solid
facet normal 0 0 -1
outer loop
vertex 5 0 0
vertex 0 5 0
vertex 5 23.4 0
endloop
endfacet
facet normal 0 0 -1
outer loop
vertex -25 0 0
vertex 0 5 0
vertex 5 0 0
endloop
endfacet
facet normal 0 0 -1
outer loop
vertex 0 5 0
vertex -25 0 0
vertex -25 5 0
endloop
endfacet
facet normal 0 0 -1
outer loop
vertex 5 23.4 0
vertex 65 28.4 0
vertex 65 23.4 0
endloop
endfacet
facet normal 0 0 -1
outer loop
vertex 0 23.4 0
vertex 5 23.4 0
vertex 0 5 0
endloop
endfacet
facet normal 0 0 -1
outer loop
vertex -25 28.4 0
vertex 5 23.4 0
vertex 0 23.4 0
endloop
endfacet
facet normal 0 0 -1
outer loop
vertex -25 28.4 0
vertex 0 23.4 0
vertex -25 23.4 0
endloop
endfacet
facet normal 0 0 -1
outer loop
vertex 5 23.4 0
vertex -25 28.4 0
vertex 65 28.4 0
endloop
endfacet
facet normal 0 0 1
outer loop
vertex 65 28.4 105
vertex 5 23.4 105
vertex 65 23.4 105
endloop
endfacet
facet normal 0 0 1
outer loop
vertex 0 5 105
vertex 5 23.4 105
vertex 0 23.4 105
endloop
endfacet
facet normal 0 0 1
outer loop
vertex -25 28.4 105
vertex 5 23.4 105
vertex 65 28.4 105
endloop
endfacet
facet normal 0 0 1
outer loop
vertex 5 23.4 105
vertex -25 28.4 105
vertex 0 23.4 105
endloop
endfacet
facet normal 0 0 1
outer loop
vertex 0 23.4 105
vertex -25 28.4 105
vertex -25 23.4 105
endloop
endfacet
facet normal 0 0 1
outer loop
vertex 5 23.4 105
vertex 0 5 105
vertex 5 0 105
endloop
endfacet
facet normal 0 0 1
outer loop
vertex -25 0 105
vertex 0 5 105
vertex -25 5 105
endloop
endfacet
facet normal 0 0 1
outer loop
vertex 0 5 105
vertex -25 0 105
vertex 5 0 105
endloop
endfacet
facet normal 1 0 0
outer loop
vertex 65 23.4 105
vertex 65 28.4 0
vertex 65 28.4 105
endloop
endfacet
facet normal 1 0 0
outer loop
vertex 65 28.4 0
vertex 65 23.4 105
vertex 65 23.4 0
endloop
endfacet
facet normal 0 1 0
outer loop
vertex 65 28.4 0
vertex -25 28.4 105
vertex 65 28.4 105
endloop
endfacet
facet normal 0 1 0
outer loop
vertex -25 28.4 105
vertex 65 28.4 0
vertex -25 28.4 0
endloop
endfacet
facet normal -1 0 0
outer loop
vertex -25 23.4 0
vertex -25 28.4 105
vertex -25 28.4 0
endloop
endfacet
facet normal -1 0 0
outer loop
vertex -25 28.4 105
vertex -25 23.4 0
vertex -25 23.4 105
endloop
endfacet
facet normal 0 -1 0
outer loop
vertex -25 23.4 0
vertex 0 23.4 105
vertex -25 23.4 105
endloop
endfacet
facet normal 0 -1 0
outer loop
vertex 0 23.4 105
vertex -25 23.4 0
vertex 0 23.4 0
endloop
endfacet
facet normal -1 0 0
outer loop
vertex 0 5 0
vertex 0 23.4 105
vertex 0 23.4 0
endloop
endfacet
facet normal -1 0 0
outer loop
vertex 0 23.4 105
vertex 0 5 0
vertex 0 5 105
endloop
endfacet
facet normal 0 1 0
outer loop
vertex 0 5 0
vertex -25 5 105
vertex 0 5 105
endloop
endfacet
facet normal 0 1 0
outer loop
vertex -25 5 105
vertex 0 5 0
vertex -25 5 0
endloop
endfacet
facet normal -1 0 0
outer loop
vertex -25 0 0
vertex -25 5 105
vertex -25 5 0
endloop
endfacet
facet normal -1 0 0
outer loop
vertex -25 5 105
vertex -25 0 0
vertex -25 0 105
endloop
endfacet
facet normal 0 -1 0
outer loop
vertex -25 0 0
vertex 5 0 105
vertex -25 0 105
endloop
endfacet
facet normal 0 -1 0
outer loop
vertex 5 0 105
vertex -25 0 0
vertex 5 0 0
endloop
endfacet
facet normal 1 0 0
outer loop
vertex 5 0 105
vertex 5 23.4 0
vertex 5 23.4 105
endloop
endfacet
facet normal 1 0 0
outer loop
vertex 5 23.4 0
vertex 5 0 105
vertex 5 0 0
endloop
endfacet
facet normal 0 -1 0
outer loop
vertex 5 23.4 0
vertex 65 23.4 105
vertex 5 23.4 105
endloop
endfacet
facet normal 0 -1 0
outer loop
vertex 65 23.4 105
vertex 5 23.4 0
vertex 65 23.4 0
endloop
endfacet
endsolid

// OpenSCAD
// Pipette Holder Clamp - Corrected
// Designed for an 18mm thick shelf.
// Printed lying on its side (XY plane is the profile, Z is the extrusion/length).

// --- Dimensions ---
shelf_thickness = 18.0;
spine_x_start   = 0.0;
spine_x_end     = 5.0;
spine_y_start   = 0.0;
spine_y_end     = 28.4;

bottom_jaw_x_start = -25.0;
bottom_jaw_x_end   = 5.0;
bottom_jaw_y_start = 0.0;
bottom_jaw_y_end   = 5.0;

top_jaw_x_start    = -25.0;
top_jaw_x_end      = 65.0;
top_jaw_y_start    = 23.4;
top_jaw_y_end      = 28.4;

extrusion_z         = 105.0;

hole_diameter       = 20.0;
hole_x_center       = 42.0;
hole_y_center       = 25.9; // Midpoint of top jaw (23.4 + 28.4)/2 = 25.9
hole_z_centers       = [17.5, 52.5, 87.5]; 

$fn = 64;

module profile() {
    // Using a polygon to ensure a single continuous manifold shape
    // The profile is a C-shape:
    // 1. Bottom jaw: (-25,0) to (5,0) to (5,5) to (-25,5)
    // 2. Spine: (0,5) to (5,5) to (5,28.4) to (0,28.4)
    // 3. Top jaw: (-25,23.4) to (65,23.4) to (65,28.4) to (-25,28.4)
    // We combine these using union to ensure they are one piece.
    union() {
        // Bottom Jaw
        polygon(points=[[bottom_jaw_x_start, bottom_jaw_y_start], [bottom_jaw_x_end, bottom_jaw_y_start], [bottom_jaw_x_end, bottom_jaw_y_end], [bottom_jaw_x_start, bottom_jaw_y_end]]);
        // Spine
        polygon(points=[[spine_x_start, spine_y_start], [spine_x_end, spine_y_start], [spine_x_end, spine_y_end], [spine_x_start, spine_y_end]]);
        // Top Jaw/Arm
        polygon(points=[[top_jaw_x_start, top_jaw_y_start], [top_jaw_x_end, top_jaw_y_start], [top_jaw_x_end, top_jaw_y_end], [top_jaw_x_start, top_jaw_y_end]]);
    }
}

difference() {
    // Main Body
    linear_extrude(height = extrusion_z)
        profile();

    // Holes through the arm along Y (vertically in use)
    // The arm is in the XY plane, so "vertically in use" means the Y axis.
    // We subtract cylinders along the Y axis.
    for (z_pos = hole_z_centers) {
        translate([hole_x_center, -1, z_pos]) // -1 to ensure it cuts through the face
            rotate([0, 90, 0])               // Rotate to point along Y
                cylinder(h = 10, d = hole_diameter); 
    }
}
